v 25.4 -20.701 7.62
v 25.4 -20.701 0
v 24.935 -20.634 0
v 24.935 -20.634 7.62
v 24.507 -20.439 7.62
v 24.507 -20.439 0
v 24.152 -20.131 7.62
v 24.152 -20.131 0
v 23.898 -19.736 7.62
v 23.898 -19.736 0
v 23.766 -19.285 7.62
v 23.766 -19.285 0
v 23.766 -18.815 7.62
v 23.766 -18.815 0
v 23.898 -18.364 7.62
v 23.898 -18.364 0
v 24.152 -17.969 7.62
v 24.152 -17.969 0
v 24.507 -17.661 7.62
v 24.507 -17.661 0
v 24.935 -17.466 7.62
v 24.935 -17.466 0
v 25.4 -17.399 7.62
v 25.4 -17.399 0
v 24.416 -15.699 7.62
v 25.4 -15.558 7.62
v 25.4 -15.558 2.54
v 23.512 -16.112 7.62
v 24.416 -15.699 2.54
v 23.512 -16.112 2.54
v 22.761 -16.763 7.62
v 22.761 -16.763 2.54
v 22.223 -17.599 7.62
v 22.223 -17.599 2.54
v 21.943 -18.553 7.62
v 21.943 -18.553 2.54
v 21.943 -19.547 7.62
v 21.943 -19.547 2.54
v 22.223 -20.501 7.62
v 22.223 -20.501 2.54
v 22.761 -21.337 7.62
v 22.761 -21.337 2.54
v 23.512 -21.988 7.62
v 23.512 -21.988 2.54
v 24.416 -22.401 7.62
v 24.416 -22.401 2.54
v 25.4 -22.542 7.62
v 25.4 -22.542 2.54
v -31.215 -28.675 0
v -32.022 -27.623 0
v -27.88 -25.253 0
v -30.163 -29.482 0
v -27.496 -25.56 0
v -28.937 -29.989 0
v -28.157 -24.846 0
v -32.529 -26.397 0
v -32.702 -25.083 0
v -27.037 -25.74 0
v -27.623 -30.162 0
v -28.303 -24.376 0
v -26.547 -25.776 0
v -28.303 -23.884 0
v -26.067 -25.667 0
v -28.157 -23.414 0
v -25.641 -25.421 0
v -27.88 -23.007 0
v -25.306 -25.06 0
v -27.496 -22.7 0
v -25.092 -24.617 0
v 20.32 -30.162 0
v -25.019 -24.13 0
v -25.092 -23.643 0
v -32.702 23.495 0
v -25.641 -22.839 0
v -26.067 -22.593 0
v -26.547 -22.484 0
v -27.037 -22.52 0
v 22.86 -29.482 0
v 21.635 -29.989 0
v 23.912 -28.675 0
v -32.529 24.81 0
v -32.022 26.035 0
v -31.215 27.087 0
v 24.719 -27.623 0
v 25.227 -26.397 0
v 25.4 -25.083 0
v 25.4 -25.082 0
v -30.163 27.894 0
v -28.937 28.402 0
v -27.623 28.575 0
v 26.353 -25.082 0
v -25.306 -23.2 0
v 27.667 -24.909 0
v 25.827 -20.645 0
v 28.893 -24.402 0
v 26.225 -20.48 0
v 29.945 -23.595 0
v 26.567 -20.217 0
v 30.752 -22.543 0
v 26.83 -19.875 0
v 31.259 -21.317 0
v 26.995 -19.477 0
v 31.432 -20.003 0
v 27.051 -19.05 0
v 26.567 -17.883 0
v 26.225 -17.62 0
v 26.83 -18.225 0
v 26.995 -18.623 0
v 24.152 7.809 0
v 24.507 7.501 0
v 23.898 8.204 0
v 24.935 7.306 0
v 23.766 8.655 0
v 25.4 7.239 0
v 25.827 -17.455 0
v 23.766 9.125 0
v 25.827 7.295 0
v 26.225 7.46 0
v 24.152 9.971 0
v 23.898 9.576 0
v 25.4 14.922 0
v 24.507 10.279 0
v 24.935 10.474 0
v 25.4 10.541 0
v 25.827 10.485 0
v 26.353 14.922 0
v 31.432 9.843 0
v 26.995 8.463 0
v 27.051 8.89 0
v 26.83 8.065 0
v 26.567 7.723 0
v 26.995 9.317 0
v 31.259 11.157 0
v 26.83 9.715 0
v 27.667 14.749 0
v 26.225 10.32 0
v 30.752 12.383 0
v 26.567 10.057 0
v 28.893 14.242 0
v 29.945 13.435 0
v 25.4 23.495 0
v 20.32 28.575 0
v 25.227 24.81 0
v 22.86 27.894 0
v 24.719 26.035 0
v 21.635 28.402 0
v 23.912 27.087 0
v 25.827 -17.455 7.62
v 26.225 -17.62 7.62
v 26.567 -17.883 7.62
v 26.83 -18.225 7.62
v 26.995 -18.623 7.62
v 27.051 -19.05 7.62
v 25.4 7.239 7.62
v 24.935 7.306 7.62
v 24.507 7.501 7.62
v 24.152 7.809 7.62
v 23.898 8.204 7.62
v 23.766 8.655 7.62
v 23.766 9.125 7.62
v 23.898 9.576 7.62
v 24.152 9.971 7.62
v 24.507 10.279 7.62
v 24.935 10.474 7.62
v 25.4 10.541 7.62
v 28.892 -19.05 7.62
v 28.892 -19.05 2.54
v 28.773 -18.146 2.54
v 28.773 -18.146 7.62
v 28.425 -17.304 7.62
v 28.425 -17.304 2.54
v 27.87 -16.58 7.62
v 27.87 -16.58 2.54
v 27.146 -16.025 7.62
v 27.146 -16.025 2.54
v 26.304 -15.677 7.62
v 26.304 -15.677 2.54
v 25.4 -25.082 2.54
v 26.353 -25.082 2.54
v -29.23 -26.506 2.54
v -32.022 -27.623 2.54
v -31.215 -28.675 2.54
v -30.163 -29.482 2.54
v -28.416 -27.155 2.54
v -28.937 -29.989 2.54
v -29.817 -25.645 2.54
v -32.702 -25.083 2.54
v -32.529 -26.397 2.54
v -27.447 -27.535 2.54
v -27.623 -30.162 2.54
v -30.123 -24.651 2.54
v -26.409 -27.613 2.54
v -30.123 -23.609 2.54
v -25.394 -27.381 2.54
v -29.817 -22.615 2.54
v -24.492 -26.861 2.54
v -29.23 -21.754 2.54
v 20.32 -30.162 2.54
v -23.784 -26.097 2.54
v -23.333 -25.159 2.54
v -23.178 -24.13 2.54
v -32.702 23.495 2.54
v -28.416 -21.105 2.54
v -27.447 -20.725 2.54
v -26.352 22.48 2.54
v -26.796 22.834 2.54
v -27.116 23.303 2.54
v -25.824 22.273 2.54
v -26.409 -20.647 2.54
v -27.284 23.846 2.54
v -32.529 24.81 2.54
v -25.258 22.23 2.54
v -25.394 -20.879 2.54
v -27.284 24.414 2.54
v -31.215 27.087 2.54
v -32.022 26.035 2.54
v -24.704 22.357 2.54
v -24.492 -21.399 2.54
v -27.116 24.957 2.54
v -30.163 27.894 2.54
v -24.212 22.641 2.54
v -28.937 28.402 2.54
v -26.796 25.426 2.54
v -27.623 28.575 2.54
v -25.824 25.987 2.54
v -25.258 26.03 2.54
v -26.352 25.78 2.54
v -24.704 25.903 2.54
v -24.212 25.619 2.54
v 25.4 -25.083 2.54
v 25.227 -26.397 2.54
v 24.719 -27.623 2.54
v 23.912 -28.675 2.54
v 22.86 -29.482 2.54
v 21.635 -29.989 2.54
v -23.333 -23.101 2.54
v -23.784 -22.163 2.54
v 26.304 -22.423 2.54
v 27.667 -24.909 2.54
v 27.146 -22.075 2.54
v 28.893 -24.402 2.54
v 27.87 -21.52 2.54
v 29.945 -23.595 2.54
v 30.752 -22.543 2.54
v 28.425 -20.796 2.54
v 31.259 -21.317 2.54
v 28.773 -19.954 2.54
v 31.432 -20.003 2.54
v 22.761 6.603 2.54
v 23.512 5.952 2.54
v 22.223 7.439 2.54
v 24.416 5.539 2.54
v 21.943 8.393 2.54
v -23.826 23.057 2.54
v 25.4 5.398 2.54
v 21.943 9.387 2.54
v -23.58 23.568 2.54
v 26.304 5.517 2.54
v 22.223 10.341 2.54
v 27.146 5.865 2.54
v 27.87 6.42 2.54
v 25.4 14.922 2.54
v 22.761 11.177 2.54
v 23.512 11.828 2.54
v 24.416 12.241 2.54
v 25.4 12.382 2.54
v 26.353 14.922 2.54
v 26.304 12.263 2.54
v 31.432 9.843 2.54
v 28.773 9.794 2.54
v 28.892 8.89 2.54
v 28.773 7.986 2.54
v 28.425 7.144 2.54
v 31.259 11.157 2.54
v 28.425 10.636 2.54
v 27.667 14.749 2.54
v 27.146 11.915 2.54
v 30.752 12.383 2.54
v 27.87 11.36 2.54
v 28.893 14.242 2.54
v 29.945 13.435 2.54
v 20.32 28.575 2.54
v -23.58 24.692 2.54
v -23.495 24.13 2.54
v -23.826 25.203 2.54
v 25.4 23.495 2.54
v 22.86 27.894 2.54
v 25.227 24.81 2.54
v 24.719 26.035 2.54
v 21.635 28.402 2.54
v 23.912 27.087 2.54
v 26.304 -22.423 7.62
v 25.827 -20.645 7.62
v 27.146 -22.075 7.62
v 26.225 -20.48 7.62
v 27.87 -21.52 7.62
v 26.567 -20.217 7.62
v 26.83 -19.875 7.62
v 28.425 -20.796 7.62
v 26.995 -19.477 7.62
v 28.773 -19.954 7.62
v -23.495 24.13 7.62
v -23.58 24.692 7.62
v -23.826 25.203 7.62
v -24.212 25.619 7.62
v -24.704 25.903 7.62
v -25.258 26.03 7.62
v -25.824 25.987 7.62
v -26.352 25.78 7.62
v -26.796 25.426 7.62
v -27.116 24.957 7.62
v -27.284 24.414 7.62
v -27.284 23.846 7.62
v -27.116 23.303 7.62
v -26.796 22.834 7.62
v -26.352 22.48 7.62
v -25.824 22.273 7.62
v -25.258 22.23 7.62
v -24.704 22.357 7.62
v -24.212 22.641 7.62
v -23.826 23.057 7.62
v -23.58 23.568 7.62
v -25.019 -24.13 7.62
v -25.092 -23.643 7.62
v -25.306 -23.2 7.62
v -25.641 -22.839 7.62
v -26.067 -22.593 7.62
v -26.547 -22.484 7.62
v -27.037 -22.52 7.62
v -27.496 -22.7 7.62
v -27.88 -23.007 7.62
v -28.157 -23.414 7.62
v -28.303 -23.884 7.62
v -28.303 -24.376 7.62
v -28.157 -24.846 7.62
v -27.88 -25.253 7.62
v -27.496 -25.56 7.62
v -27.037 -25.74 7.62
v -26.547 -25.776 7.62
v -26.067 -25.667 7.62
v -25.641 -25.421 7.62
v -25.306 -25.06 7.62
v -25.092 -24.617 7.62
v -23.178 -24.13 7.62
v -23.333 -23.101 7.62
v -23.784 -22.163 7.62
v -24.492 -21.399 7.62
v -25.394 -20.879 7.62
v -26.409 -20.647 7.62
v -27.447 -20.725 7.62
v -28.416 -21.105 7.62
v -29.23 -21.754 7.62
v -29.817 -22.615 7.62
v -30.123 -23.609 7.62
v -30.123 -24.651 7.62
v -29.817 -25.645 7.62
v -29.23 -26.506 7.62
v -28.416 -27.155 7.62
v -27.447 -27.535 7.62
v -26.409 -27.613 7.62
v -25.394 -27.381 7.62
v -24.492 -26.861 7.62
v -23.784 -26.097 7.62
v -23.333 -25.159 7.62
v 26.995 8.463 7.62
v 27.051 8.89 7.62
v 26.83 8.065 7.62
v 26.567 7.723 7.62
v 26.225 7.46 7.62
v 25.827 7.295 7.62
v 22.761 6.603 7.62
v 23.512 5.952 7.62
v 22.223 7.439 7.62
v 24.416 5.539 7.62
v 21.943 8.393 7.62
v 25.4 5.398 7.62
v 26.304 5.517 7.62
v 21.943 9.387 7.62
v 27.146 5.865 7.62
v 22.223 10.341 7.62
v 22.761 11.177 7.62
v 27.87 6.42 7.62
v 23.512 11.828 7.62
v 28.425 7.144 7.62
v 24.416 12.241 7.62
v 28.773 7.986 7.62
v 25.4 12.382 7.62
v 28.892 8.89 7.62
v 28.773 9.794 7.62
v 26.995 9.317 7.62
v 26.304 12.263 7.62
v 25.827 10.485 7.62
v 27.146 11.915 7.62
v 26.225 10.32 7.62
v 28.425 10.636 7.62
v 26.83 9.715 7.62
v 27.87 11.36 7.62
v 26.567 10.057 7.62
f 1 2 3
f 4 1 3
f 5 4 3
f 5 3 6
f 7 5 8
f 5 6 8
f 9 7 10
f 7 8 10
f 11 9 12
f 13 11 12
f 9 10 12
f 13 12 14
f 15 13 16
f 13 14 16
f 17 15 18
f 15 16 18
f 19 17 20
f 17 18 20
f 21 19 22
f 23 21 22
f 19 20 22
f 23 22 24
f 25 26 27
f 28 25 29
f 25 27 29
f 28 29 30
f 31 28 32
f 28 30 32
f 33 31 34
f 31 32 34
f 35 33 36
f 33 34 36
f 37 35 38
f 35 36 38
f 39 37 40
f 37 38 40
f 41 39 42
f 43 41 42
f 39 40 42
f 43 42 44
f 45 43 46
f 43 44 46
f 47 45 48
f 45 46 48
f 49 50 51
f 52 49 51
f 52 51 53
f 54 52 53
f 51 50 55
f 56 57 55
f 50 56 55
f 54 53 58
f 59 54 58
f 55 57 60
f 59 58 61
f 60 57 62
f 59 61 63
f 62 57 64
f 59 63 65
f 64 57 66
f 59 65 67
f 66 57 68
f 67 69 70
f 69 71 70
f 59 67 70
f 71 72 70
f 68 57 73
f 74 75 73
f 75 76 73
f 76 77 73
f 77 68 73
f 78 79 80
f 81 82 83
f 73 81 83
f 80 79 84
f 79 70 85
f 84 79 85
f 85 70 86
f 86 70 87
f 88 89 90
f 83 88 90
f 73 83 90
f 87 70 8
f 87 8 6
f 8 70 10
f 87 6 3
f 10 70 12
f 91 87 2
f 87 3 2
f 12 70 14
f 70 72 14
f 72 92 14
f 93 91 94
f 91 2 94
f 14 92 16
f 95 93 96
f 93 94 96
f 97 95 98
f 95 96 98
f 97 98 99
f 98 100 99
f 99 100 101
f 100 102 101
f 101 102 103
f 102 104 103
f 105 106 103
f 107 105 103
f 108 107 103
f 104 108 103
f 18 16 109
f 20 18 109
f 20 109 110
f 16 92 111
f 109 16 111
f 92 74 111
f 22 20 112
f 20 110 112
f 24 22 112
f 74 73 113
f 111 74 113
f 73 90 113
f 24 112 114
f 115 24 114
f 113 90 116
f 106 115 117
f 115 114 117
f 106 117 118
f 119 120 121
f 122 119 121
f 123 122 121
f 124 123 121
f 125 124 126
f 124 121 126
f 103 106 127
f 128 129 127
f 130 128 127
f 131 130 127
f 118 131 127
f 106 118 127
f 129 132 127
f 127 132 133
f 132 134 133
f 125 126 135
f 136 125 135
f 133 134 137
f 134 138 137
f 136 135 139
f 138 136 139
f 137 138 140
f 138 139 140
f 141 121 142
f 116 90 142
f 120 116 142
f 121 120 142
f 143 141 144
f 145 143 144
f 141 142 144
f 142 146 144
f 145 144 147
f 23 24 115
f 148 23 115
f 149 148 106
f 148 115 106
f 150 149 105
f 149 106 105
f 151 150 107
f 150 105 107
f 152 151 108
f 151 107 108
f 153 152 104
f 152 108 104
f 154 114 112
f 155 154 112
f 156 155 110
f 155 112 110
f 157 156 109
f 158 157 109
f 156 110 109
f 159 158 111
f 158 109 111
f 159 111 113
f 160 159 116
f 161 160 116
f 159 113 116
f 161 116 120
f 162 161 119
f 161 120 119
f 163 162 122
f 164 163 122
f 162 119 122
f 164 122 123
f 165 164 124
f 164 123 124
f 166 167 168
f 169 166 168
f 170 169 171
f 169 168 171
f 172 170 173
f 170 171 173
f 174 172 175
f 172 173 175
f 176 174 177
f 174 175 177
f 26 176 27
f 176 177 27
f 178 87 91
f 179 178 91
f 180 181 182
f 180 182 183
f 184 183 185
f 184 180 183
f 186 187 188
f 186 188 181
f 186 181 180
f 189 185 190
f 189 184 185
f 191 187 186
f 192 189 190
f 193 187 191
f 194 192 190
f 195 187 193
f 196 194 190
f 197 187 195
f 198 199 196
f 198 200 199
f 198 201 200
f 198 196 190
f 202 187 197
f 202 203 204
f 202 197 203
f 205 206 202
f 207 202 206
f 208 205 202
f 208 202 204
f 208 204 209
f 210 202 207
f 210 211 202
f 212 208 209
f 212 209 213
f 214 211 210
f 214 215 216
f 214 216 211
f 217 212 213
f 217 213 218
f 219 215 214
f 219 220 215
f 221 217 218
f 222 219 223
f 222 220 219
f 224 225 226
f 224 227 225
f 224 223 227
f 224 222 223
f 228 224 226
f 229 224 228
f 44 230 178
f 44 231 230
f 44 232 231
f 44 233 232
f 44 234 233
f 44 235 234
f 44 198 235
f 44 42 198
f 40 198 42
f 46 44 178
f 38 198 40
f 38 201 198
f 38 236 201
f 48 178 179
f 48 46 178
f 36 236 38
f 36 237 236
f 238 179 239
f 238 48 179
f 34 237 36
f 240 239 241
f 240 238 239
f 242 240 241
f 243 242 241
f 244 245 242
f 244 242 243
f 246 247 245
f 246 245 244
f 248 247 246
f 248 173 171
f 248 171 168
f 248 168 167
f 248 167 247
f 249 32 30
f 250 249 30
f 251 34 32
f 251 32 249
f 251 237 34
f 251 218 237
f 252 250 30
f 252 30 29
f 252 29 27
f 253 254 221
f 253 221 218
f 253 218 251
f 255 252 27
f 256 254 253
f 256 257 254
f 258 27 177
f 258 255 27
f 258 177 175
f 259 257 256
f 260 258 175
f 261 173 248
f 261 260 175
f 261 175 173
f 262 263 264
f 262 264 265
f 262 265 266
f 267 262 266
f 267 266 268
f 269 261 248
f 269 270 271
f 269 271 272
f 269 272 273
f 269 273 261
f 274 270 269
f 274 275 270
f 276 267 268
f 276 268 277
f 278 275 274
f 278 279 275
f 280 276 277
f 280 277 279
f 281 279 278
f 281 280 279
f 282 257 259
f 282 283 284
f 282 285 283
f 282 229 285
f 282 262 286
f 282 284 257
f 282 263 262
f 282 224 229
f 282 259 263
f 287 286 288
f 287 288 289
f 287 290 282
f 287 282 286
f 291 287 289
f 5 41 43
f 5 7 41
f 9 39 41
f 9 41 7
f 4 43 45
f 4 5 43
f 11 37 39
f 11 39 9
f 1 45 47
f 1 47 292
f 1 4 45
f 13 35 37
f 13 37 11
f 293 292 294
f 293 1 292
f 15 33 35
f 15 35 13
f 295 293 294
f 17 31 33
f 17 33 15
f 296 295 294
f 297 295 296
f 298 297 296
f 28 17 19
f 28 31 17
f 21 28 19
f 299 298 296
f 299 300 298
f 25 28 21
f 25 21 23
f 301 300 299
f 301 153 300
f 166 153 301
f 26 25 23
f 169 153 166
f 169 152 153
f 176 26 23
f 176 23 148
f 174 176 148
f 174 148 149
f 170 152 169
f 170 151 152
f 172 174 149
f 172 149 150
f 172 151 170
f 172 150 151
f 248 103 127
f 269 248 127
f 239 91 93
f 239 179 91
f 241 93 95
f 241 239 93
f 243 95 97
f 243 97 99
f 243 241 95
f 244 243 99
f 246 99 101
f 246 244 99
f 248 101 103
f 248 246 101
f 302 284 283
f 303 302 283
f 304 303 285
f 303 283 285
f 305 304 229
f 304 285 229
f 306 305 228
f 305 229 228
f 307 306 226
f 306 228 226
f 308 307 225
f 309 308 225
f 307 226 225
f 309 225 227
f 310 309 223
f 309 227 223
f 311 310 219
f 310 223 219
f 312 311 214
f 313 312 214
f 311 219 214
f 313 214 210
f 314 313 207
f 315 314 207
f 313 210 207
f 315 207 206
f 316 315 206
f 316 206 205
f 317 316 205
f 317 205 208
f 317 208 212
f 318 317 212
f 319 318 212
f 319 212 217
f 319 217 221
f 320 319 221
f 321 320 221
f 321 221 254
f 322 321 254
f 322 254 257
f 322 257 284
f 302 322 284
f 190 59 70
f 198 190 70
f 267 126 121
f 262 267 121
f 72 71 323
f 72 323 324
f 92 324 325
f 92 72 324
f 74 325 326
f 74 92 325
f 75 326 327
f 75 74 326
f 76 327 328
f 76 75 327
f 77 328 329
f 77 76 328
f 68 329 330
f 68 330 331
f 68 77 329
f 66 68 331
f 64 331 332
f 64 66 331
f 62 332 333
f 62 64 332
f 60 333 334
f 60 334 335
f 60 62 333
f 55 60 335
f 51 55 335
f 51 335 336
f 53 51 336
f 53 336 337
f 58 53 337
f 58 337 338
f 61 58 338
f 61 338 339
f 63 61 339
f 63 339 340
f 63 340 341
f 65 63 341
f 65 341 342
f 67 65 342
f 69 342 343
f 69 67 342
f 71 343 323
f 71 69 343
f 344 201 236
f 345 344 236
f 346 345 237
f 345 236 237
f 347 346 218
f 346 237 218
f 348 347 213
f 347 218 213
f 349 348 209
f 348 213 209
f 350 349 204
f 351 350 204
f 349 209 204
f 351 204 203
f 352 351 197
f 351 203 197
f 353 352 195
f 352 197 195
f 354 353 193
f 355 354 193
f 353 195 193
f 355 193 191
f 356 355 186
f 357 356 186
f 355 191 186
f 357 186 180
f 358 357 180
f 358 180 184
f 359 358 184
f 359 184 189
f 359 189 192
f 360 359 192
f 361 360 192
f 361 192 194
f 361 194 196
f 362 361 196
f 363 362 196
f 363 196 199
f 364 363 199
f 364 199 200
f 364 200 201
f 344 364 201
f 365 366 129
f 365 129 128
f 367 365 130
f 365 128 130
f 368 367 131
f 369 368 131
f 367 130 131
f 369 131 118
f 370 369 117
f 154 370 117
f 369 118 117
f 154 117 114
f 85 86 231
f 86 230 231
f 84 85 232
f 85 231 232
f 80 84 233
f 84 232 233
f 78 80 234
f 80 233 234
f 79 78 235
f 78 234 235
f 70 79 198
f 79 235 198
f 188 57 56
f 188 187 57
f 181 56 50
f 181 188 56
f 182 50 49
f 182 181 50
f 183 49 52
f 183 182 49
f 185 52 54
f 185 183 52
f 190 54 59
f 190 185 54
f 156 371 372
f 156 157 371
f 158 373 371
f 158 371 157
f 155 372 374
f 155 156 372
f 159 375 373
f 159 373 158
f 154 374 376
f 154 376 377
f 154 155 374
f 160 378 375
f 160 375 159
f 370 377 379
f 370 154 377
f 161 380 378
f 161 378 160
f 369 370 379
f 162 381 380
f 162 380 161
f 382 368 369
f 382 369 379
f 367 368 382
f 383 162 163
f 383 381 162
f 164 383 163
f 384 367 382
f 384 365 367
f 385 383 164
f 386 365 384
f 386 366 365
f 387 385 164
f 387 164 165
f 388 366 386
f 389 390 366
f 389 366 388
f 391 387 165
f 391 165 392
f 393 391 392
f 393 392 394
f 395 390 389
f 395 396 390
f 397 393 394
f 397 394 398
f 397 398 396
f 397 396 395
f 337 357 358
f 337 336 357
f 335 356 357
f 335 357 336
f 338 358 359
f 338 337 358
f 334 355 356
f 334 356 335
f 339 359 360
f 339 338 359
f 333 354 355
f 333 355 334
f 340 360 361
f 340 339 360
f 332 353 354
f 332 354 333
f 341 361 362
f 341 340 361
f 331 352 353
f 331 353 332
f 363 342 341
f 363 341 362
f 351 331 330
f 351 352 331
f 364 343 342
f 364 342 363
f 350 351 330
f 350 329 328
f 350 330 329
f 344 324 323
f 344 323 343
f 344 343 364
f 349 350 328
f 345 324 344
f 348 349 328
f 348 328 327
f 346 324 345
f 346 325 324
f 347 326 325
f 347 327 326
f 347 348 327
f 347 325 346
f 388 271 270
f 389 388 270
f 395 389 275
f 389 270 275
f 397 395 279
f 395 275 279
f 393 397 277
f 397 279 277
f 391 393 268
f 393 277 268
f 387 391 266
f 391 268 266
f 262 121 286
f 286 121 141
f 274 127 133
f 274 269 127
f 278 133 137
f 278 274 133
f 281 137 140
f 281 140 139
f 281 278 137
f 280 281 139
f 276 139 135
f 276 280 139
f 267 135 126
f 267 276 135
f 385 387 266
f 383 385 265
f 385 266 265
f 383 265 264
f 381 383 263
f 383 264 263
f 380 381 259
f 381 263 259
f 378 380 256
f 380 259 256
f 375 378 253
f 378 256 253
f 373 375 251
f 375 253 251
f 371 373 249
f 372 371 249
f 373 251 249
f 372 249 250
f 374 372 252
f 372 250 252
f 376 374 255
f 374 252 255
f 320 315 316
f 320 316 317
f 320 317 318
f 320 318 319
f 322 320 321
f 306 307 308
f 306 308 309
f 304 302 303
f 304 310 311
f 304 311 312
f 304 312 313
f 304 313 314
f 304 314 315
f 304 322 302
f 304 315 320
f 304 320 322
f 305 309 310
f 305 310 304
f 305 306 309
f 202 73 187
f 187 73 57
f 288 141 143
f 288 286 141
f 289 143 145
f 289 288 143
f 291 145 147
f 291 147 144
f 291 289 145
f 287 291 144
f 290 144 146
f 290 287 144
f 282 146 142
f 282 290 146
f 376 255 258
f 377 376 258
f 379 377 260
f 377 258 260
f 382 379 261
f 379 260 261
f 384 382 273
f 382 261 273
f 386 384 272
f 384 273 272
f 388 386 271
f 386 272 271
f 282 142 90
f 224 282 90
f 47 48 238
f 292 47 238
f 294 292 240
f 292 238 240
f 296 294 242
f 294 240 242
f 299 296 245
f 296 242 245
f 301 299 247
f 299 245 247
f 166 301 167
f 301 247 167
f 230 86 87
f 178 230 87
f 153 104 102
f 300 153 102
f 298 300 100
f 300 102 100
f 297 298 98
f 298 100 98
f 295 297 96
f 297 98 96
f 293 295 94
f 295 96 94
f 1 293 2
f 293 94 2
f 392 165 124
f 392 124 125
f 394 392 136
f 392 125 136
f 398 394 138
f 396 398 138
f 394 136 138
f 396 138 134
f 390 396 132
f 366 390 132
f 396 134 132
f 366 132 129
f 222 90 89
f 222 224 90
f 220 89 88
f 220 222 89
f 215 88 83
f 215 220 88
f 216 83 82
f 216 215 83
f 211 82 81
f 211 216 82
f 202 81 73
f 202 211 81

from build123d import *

# Parameters (mm, degrees)
F1_R     = 3.4925
F1_R_2   = 1.905
F2_DEPTH = 2.54
F1_R_3   = 1.651
F3_DEPTH = 7.62
F4_R     = 5.07999


# Not quite as in the source:
# - a fillet or chamfer is up to 0.001 mm smaller than in the source, because OpenCascade refuses the exact size


with BuildPart() as f2:
    # F1 (on Top) → F2 (new body)
    with BuildSketch(Plane.XY):
        with BuildLine():
            ThreePointArc((25.4, -22.5425), (21.9075, -19.05), (25.4, -15.5575))
            Line((25.4, -15.5575), (25.4, 5.3975))
            ThreePointArc((25.4, 5.3975), (21.9075, 8.89), (25.4, 12.3825))
            Line((25.4, 12.3825), (25.4, 14.9225))
            Line((25.4, 14.9225), (25.4, 28.575))
            Line((25.4, 28.575), (-32.7025, 28.575))
            Line((-32.7025, 28.575), (-32.7025, -30.1625))
            Line((-32.7025, -30.1625), (25.4, -30.1625))
            Line((25.4, -30.1625), (25.4, -25.0825))
            Line((25.4, -25.0825), (25.4, -22.5425))
        make_face()
        with Locations((-26.67, -24.13)):
            Circle(F1_R, mode=Mode.SUBTRACT)
        with Locations((-25.4, 24.13)):
            Circle(F1_R_2, mode=Mode.SUBTRACT)
        with BuildLine():
            ThreePointArc((25.4, -15.5575), (27.8695704333, -16.5804295667), (28.8925, -19.05))
            ThreePointArc((28.8925, -19.05), (27.8695704333, -21.5195704333), (25.4, -22.5425))
            Line((25.4, -22.5425), (25.4, -25.0825))
            Line((25.4, -25.0825), (31.4325, -25.0825))
            Line((31.4325, -25.0825), (31.4325, 14.9225))
            Line((31.4325, 14.9225), (25.4, 14.9225))
            Line((25.4, 14.9225), (25.4, 12.3825))
            ThreePointArc((25.4, 12.3825), (27.8695704333, 11.3595704333), (28.8925, 8.89))
            ThreePointArc((28.8925, 8.89), (27.8695704333, 6.4204295667), (25.4, 5.3975))
            Line((25.4, 5.3975), (25.4, -15.5575))
        make_face()
    extrude(amount=F2_DEPTH)

    # F1 (on Top) → F3 (join)
    with BuildSketch(Plane.XY):
        with Locations((-26.67, -24.13)):
            Circle(F1_R)
        with Locations((-26.67, -24.13)):
            Circle(F1_R_3, mode=Mode.SUBTRACT)
        with Locations((-25.4, 24.13)):
            Circle(F1_R_2)
        with BuildLine():
            ThreePointArc((25.4, 12.3825), (21.9075, 8.89), (25.4, 5.3975))
            Line((25.4, 5.3975), (25.4, 7.239))
            ThreePointArc((25.4, 7.239), (23.749, 8.89), (25.4, 10.541))
            Line((25.4, 10.541), (25.4, 12.3825))
        make_face()
        with BuildLine():
            Line((25.4, 7.239), (25.4, 5.3975))
            ThreePointArc((25.4, 5.3975), (27.8695704333, 6.4204295667), (28.8925, 8.89))
            ThreePointArc((28.8925, 8.89), (27.8695704333, 11.3595704333), (25.4, 12.3825))
            Line((25.4, 12.3825), (25.4, 10.541))
            ThreePointArc((25.4, 10.541), (26.5674332957, 10.0574332957), (27.051, 8.89))
            ThreePointArc((27.051, 8.89), (26.5674332957, 7.7225667043), (25.4, 7.239))
        make_face()
        with BuildLine():
            Line((25.4, -17.399), (25.4, -15.5575))
            ThreePointArc((25.4, -15.5575), (21.9075, -19.05), (25.4, -22.5425))
            Line((25.4, -22.5425), (25.4, -20.701))
            ThreePointArc((25.4, -20.701), (23.749, -19.05), (25.4, -17.399))
        make_face()
        with BuildLine():
            ThreePointArc((25.4, -22.5425), (27.8695704333, -21.5195704333), (28.8925, -19.05))
            ThreePointArc((28.8925, -19.05), (27.8695704333, -16.5804295667), (25.4, -15.5575))
            Line((25.4, -15.5575), (25.4, -17.399))
            ThreePointArc((25.4, -17.399), (26.5674332957, -17.8825667043), (27.051, -19.05))
            ThreePointArc((27.051, -19.05), (26.5674332957, -20.2174332957), (25.4, -20.701))
            Line((25.4, -20.701), (25.4, -22.5425))
        make_face()
    extrude(amount=F3_DEPTH)

    # F4 (radius 5.08 in the source; OpenCascade refuses exactly that, so slightly less here)
    f4_edges = [f2.edges().sort_by_distance(p)[0] for p in [
        (-32.7025, -30.1625, 1.27),
        (25.4, -30.1625, 1.27),
        (31.4325, -25.0825, 1.27),
        (31.4325, 14.9225, 1.27),
        (25.4, 28.575, 1.27),
        (-32.7025, 28.575, 1.27),
    ]]
    fillet(f4_edges, radius=F4_R)


solid = f2.part
